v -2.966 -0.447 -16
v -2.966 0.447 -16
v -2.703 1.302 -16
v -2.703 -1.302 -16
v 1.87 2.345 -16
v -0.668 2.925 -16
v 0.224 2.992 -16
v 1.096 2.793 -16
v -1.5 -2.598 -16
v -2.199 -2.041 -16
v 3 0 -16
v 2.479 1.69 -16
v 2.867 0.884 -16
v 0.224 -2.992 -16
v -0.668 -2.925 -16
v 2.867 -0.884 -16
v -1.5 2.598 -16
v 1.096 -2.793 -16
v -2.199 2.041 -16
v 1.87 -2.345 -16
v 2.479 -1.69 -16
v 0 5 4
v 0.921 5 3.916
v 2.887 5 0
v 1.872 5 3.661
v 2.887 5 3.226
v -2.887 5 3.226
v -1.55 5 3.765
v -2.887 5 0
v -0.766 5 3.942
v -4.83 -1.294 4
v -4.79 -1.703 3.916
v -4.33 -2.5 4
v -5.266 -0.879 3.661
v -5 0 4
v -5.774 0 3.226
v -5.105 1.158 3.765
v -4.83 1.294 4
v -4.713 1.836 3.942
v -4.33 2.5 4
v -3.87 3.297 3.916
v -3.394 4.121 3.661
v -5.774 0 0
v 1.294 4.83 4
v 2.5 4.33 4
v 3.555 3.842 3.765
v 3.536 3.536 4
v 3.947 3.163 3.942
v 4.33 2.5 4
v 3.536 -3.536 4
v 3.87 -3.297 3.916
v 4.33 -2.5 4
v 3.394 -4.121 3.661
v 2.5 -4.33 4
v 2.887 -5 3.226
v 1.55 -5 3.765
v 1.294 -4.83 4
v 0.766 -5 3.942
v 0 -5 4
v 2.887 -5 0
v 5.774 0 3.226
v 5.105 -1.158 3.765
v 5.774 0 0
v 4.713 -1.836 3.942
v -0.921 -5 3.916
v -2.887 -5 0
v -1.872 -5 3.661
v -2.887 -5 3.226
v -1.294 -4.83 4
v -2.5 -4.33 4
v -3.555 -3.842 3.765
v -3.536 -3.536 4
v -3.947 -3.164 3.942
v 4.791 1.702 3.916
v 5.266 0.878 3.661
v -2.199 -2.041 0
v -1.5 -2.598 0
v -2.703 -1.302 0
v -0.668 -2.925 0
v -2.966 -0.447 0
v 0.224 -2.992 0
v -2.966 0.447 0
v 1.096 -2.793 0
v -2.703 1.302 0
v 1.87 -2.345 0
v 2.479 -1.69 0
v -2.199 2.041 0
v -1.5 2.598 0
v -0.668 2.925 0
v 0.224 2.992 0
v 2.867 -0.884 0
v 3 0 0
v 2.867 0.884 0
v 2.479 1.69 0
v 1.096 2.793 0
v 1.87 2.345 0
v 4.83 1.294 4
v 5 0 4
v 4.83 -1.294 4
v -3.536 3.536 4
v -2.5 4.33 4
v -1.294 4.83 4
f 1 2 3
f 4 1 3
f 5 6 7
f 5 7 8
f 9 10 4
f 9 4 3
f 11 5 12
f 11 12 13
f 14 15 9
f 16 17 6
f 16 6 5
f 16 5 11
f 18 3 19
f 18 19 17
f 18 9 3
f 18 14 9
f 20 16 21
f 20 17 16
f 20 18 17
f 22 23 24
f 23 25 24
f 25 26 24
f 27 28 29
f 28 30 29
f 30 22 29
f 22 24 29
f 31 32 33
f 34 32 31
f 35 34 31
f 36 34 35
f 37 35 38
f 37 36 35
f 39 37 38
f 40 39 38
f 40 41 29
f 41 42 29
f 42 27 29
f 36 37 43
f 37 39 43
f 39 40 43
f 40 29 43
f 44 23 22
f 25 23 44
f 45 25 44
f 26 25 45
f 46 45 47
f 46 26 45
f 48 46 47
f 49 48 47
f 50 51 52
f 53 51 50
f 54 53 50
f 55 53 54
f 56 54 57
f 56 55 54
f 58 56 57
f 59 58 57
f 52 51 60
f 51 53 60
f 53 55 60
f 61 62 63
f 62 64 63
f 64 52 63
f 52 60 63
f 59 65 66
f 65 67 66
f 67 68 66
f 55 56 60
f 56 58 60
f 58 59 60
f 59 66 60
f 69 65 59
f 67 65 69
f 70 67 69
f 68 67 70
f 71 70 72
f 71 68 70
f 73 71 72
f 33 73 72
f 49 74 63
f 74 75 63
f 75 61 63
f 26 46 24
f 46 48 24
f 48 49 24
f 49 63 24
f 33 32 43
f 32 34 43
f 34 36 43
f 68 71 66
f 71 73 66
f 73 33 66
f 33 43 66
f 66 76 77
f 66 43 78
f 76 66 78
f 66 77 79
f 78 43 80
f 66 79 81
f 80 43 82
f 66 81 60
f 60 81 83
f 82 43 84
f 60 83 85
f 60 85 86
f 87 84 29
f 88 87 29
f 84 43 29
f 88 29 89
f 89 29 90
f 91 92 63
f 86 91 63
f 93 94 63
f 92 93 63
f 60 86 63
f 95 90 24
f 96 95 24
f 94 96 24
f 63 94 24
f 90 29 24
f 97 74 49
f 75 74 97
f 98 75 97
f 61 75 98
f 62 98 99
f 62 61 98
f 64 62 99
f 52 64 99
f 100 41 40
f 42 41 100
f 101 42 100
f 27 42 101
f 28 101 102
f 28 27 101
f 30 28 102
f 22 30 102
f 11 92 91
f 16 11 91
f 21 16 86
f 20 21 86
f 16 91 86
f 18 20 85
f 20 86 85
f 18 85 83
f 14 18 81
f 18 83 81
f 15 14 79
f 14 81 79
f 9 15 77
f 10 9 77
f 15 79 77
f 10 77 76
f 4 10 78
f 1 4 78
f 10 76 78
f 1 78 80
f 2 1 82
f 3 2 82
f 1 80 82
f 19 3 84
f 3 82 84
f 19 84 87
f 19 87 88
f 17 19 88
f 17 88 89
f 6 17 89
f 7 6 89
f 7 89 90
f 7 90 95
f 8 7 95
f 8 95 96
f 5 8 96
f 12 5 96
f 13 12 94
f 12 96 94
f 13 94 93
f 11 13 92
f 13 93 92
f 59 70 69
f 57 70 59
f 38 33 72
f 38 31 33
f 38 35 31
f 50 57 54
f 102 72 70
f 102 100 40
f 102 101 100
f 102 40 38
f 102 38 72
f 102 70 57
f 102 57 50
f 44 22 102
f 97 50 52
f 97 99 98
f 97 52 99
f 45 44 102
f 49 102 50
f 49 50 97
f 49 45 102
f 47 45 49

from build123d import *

# Parameters (mm, degrees)
F1_DEPTH = 4
F2_R     = 3
F3_DEPTH = 16


with BuildPart() as f1:
    # F0 (on Top) → F1 (new body)
    with BuildSketch(Plane.XY):
        Polygon((-2.886751, -5), (2.886751, -5), (5.773503, 0), (2.886751, 5), (-2.886751, 5), (-5.773503, 0), align=None)
    extrude(amount=F1_DEPTH)

    # F2 (on face) → F3 (join)
    with BuildSketch(Plane(origin=(0, 0, 0), x_dir=(1, 0, 0), z_dir=(0, 0, -1))):
        Circle(F2_R)
    extrude(amount=F3_DEPTH)

    # F4 (on Right) → F5 (revolve, cut)
    with BuildSketch(Plane.YZ):
        Polygon((9, 4), (5, 4), (9, 0), align=None)
    revolve(axis=Axis((0, 0, -1.209494), (0, 0, -1)), mode=Mode.SUBTRACT)


solid = f1.part
